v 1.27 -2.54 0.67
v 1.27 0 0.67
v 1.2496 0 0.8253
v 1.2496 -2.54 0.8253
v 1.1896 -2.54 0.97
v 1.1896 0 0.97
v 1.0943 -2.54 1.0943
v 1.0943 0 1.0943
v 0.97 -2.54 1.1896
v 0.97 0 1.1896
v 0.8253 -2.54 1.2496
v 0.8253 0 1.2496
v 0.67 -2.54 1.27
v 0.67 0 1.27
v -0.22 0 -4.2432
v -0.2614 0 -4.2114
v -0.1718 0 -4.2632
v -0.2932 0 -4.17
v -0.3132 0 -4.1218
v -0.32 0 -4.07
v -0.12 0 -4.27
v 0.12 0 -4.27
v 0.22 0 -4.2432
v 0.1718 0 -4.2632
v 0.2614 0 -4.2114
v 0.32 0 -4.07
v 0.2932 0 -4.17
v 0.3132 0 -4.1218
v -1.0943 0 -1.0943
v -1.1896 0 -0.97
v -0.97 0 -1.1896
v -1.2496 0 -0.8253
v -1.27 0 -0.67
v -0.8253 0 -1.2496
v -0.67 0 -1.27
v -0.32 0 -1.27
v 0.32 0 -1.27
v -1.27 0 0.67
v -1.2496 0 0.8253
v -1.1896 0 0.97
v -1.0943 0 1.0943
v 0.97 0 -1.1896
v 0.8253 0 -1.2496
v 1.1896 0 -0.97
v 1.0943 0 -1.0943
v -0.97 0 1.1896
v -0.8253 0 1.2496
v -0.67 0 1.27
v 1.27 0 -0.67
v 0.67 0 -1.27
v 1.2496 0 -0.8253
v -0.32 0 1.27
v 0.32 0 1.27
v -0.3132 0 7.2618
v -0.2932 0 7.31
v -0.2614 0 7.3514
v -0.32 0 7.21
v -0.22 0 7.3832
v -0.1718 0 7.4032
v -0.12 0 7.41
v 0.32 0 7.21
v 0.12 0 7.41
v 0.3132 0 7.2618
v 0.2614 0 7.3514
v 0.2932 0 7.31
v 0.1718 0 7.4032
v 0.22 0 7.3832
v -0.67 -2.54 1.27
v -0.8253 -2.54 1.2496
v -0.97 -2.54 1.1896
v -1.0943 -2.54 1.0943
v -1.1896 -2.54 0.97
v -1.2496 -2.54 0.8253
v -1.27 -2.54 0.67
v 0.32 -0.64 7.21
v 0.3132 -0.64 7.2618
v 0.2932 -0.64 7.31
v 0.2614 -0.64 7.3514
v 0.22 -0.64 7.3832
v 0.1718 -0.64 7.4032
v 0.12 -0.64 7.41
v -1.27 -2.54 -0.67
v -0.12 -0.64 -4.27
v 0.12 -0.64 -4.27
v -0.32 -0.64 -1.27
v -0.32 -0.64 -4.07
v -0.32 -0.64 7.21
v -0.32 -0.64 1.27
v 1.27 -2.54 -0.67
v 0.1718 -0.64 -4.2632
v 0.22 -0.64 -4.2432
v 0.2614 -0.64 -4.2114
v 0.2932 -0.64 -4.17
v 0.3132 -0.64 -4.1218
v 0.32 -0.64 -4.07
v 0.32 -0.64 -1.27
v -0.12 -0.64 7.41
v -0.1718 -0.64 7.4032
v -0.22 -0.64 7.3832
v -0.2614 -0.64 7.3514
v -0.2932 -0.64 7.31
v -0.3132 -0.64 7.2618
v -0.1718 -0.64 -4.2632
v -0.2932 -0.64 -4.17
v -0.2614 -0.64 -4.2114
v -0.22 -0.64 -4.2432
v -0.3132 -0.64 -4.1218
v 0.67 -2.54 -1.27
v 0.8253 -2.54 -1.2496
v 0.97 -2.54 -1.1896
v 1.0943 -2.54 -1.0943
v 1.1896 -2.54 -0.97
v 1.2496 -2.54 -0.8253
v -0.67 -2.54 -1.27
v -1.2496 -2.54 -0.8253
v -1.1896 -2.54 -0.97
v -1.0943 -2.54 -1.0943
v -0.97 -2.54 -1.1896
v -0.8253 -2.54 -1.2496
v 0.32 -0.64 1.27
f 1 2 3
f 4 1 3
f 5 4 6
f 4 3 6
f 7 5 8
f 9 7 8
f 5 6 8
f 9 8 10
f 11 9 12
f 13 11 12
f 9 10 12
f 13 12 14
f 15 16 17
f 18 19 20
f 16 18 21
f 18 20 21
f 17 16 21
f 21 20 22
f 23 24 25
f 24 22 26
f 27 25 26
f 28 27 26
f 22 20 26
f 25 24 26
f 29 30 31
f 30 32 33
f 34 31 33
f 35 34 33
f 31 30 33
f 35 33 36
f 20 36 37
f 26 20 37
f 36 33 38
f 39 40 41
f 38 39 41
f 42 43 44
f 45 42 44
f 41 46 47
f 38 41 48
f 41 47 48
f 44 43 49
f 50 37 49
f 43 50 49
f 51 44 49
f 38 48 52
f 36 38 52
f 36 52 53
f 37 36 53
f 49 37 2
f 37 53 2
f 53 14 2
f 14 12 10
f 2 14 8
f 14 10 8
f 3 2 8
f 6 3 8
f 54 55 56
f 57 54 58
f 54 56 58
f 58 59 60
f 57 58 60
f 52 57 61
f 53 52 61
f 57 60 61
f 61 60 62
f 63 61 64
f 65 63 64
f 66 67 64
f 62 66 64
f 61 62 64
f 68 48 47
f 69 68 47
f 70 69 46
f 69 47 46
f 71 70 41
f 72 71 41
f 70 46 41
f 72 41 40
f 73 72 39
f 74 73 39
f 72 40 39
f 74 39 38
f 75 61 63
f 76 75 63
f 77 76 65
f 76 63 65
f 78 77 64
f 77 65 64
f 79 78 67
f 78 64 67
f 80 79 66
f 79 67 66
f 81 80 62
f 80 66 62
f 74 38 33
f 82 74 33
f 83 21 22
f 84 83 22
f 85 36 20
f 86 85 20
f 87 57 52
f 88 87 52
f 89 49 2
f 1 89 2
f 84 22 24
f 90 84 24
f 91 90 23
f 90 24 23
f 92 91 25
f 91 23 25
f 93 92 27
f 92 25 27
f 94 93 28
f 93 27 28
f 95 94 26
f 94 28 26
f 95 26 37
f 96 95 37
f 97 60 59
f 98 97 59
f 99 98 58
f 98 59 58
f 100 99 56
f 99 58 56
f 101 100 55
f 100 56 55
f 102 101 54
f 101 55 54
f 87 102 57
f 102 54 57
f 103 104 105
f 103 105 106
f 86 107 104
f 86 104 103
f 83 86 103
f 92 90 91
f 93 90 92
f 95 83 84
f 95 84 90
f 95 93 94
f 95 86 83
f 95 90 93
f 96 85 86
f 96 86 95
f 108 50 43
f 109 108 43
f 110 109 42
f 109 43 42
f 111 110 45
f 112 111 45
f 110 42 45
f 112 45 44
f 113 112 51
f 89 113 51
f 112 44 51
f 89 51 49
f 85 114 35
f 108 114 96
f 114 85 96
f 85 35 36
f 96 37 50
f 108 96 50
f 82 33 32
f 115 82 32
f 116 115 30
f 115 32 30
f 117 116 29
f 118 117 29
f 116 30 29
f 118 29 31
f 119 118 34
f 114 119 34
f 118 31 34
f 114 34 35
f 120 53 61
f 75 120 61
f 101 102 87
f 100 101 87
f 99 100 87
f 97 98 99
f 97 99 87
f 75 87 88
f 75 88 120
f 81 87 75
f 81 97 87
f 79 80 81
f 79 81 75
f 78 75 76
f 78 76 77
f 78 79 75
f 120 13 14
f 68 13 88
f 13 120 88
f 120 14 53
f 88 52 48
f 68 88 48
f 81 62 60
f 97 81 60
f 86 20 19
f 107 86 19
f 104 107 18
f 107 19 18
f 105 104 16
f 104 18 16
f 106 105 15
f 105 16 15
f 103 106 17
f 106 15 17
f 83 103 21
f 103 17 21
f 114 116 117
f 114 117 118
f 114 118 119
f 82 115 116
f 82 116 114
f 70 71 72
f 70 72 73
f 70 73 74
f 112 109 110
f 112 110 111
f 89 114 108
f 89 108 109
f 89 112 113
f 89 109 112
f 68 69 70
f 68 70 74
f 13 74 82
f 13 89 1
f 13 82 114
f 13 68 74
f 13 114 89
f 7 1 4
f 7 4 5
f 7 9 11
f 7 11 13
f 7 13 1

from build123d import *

# Parameters (mm, degrees)
F0_W     = 0.64
F0_H     = 2.54
F1_DEPTH = 2.54
F2_DEPTH = 0.64


with BuildPart() as f1:
    # F0 (on Front) → F1 (new body)
    with BuildSketch(Plane.XZ):
        with BuildLine():
            Line((-0.32, 1.27), (-0.67, 1.27))
            ThreePointArc((-0.67, 1.27), (-1.0942640687, 1.0942640687), (-1.27, 0.67))
            Line((-1.27, 0.67), (-1.27, -0.67))
            ThreePointArc((-1.27, -0.67), (-1.0942640687, -1.0942640687), (-0.67, -1.27))
            Line((-0.67, -1.27), (-0.32, -1.27))
            Line((-0.32, -1.27), (-0.32, 1.27))
        make_face()
        with BuildLine():
            Line((0.67, 1.27), (0.32, 1.27))
            Line((0.32, 1.27), (0.32, -1.27))
            Line((0.32, -1.27), (0.67, -1.27))
            ThreePointArc((0.67, -1.27), (1.0942640687, -1.0942640687), (1.27, -0.67))
            Line((1.27, -0.67), (1.27, 0.67))
            ThreePointArc((1.27, 0.67), (1.0942640687, 1.0942640687), (0.67, 1.27))
        make_face()
        Rectangle(F0_W, F0_H)
    extrude(amount=F1_DEPTH)

    # F0 (on Front) → F2 (join)
    with BuildSketch(Plane.XZ):
        with BuildLine():
            Line((-0.32, 7.21), (-0.32, 1.27))
            Line((-0.32, 1.27), (0.32, 1.27))
            Line((0.32, 1.27), (0.32, 7.21))
            ThreePointArc((0.32, 7.21), (0.2614213562, 7.3514213562), (0.12, 7.41))
            Line((0.12, 7.41), (-0.12, 7.41))
            ThreePointArc((-0.12, 7.41), (-0.2614213562, 7.3514213562), (-0.32, 7.21))
        make_face()
        Rectangle(F0_W, F0_H)
        with BuildLine():
            Line((-0.32, 1.27), (-0.67, 1.27))
            ThreePointArc((-0.67, 1.27), (-1.0942640687, 1.0942640687), (-1.27, 0.67))
            Line((-1.27, 0.67), (-1.27, -0.67))
            ThreePointArc((-1.27, -0.67), (-1.0942640687, -1.0942640687), (-0.67, -1.27))
            Line((-0.67, -1.27), (-0.32, -1.27))
            Line((-0.32, -1.27), (-0.32, 1.27))
        make_face()
        with BuildLine():
            Line((0.67, 1.27), (0.32, 1.27))
            Line((0.32, 1.27), (0.32, -1.27))
            Line((0.32, -1.27), (0.67, -1.27))
            ThreePointArc((0.67, -1.27), (1.0942640687, -1.0942640687), (1.27, -0.67))
            Line((1.27, -0.67), (1.27, 0.67))
            ThreePointArc((1.27, 0.67), (1.0942640687, 1.0942640687), (0.67, 1.27))
        make_face()
        with BuildLine():
            Line((0.32, -1.27), (-0.32, -1.27))
            Line((-0.32, -1.27), (-0.32, -4.07))
            ThreePointArc((-0.32, -4.07), (-0.2614213562, -4.2114213562), (-0.12, -4.27))
            Line((-0.12, -4.27), (0.12, -4.27))
            ThreePointArc((0.12, -4.27), (0.2614213562, -4.2114213562), (0.32, -4.07))
            Line((0.32, -4.07), (0.32, -1.27))
        make_face()
    extrude(amount=F2_DEPTH)


solid = f1.part
